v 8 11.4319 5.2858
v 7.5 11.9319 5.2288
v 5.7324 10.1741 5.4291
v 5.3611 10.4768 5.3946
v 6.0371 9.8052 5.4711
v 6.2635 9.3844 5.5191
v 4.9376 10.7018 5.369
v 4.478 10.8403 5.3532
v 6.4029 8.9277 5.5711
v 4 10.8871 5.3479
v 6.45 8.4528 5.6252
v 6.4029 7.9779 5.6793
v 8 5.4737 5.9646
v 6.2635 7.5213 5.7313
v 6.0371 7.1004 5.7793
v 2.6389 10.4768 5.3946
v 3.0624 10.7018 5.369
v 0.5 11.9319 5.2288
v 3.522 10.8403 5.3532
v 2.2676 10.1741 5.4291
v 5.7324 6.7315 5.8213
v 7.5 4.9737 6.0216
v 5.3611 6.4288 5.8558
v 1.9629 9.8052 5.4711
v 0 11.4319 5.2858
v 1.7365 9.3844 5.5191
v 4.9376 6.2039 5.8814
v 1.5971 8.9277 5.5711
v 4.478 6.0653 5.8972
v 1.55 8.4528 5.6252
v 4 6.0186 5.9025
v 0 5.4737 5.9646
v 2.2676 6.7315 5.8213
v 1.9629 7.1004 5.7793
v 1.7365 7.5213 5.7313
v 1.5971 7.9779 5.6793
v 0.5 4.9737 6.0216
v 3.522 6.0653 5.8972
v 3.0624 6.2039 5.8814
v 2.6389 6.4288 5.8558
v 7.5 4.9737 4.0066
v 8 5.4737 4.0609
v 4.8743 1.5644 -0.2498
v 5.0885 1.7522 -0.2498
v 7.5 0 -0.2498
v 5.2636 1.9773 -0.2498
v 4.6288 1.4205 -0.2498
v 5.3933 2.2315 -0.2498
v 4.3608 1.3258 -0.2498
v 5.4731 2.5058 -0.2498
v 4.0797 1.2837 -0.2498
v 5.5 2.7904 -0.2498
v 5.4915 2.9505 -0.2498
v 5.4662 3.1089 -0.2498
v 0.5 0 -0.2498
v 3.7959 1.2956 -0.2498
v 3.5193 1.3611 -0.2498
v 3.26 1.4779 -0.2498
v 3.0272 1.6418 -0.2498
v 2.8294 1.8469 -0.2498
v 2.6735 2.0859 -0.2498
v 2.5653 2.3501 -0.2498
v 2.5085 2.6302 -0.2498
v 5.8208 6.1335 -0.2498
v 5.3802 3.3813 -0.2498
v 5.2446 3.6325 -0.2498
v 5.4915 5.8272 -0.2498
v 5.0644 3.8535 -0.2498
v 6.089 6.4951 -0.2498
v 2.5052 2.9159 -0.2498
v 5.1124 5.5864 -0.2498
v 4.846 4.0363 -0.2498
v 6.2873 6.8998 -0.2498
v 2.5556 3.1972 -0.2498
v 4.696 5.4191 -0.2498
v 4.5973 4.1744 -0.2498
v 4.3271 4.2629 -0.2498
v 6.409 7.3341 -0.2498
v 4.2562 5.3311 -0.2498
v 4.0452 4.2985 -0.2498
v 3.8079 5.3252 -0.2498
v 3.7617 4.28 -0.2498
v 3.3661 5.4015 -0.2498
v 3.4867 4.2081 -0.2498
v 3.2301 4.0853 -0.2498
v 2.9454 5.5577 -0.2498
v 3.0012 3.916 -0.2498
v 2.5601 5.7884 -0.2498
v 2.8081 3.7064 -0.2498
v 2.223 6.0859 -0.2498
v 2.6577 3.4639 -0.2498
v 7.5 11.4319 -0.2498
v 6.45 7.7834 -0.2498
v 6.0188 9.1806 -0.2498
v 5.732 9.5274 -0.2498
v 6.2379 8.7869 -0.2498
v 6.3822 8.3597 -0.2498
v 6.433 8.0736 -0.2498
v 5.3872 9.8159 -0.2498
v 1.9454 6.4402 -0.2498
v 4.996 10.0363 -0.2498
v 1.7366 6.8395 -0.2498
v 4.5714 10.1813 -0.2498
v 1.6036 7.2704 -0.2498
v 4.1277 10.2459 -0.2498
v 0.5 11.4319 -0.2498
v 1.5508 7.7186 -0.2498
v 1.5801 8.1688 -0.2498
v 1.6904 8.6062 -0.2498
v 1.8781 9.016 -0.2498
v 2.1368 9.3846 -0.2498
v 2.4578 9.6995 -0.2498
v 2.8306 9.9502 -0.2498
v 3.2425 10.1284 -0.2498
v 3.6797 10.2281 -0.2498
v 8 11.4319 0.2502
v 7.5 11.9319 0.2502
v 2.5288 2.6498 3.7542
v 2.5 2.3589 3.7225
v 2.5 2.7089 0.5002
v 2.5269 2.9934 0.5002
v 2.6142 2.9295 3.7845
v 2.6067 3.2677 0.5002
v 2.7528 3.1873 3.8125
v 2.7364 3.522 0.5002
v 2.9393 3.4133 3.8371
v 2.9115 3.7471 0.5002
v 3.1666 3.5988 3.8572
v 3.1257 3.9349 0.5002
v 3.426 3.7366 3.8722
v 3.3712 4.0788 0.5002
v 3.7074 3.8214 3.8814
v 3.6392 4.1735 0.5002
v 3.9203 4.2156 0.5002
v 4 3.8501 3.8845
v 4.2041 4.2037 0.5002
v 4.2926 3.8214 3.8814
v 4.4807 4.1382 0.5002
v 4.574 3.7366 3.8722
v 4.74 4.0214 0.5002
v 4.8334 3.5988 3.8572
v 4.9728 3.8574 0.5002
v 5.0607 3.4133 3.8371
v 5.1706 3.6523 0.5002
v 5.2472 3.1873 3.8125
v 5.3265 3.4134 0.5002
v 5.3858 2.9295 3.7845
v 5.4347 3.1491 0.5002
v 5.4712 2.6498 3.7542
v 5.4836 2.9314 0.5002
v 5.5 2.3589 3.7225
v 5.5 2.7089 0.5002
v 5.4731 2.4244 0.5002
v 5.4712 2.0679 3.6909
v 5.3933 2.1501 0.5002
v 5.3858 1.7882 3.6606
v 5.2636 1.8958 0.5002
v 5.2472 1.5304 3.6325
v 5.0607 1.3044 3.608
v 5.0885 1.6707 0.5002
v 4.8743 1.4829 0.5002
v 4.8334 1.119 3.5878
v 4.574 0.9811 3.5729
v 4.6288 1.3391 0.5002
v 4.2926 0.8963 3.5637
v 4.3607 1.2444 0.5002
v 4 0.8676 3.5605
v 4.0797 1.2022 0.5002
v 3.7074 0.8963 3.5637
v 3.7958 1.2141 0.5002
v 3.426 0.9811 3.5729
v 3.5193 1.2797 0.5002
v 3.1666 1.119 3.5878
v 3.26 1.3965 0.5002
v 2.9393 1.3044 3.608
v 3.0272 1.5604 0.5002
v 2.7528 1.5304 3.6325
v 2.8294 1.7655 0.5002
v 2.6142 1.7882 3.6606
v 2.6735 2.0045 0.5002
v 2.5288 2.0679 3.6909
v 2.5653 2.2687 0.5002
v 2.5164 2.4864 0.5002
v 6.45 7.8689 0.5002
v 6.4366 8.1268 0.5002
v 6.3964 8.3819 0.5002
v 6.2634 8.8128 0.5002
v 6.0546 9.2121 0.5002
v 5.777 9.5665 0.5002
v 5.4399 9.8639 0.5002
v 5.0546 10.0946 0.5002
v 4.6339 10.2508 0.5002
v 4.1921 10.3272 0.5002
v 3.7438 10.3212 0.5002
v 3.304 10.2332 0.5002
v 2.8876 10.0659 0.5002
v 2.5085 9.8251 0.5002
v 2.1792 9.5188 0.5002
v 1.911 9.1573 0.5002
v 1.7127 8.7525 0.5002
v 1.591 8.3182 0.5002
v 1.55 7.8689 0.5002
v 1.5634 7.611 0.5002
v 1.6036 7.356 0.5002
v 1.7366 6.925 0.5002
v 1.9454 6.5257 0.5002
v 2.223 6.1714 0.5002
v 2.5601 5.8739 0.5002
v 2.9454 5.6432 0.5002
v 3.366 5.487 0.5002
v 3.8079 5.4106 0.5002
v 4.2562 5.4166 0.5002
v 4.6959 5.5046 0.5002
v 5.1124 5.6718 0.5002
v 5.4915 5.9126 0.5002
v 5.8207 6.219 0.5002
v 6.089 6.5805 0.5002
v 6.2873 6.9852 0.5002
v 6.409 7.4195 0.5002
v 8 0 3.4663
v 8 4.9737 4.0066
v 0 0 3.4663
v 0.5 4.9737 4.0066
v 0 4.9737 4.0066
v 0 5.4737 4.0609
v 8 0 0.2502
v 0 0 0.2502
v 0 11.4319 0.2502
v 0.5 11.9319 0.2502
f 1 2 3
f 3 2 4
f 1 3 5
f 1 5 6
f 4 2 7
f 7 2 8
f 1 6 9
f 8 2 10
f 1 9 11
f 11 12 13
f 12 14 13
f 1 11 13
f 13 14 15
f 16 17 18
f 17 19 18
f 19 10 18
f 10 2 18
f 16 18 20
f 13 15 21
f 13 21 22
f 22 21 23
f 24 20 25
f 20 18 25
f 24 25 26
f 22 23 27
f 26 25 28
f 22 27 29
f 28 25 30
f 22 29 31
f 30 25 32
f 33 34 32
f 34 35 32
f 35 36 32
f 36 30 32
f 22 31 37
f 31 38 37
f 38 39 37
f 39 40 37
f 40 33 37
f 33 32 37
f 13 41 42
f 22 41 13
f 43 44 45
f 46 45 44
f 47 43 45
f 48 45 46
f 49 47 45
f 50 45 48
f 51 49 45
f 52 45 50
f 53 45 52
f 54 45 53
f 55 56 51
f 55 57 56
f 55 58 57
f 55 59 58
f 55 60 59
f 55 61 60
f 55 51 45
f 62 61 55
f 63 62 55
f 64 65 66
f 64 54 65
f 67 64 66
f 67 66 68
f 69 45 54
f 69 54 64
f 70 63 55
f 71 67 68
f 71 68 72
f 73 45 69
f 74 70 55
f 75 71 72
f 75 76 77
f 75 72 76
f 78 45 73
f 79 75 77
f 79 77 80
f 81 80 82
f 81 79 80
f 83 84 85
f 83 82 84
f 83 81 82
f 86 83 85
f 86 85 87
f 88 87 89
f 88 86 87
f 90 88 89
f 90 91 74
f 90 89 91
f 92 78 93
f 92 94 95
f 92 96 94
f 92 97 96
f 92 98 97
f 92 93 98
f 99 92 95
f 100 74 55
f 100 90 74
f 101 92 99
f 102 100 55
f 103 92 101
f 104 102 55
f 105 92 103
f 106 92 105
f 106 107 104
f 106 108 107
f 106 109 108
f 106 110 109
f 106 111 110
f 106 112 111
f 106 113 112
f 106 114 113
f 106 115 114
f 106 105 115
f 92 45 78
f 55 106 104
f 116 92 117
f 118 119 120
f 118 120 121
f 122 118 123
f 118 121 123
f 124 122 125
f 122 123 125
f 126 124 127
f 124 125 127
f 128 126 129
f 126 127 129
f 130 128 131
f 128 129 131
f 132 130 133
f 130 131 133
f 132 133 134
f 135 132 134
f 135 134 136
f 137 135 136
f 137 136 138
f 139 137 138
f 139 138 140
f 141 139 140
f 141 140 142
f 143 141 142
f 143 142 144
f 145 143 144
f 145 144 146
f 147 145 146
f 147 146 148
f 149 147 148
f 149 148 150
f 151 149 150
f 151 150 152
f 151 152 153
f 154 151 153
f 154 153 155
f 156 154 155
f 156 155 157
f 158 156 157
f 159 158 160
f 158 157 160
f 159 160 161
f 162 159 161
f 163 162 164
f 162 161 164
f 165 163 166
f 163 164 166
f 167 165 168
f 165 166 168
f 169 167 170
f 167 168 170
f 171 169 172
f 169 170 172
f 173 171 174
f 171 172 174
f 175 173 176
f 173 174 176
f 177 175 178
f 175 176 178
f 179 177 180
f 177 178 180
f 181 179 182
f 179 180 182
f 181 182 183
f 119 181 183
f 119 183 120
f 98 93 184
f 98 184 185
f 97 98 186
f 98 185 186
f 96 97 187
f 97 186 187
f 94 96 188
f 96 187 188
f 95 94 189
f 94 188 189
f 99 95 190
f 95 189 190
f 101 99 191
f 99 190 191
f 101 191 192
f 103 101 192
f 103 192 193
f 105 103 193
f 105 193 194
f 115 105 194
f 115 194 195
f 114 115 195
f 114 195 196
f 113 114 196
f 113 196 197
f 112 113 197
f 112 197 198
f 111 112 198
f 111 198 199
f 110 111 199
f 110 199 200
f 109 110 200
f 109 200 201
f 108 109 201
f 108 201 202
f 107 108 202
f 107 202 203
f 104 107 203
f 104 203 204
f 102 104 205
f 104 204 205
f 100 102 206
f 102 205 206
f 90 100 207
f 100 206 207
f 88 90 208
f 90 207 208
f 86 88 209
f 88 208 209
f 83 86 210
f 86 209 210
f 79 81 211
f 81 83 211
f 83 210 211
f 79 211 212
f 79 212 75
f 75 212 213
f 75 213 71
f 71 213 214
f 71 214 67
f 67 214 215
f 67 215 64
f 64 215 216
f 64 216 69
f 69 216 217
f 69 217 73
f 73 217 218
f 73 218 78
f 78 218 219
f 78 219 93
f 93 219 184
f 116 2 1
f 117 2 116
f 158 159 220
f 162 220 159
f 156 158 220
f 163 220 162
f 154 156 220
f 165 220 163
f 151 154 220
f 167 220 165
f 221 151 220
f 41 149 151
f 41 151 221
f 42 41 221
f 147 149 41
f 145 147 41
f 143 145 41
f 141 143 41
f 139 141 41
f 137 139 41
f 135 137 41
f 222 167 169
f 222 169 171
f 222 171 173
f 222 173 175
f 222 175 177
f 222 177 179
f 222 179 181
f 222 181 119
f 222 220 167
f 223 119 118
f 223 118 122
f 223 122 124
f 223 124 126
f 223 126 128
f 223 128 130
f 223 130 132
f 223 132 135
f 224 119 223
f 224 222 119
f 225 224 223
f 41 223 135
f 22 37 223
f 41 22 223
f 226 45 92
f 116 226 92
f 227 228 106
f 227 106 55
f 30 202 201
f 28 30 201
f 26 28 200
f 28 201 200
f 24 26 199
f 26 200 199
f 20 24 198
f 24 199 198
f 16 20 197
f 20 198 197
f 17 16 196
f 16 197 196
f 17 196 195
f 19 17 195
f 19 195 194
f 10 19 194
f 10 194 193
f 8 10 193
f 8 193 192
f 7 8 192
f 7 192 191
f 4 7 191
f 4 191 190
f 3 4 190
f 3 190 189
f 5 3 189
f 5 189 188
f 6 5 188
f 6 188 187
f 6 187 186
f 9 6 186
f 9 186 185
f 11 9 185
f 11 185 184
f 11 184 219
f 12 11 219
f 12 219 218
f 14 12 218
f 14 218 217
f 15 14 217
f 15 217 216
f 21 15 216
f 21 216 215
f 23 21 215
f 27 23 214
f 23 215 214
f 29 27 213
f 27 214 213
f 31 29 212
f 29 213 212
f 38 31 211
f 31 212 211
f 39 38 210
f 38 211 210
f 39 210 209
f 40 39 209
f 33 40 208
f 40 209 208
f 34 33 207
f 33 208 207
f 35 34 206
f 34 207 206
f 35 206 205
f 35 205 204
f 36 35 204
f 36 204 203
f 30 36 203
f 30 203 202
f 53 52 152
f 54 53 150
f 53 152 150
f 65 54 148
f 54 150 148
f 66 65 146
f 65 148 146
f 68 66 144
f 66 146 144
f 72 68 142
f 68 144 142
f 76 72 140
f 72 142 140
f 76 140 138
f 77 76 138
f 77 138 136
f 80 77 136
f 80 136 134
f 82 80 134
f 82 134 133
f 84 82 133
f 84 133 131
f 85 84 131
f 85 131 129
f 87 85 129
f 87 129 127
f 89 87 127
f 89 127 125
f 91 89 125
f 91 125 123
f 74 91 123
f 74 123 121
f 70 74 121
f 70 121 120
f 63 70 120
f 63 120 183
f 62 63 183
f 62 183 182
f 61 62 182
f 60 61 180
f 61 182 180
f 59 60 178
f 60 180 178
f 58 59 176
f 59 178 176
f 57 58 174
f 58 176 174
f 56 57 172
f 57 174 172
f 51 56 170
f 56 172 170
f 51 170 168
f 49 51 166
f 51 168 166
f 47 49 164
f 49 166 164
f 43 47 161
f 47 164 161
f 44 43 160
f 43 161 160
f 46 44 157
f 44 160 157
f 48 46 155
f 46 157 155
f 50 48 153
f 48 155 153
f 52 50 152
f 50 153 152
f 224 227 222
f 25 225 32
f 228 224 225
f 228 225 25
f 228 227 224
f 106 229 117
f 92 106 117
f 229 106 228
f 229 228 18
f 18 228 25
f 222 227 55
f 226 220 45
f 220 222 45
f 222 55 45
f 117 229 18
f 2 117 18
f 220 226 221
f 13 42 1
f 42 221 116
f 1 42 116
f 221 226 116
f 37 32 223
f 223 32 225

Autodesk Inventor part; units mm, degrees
ref_plane "YZ Plane" through (0, 0, 0) normal (1, 0, 0) x (0, 1, 0)
ref_plane "XZ Plane" through (0, 0, 0) normal (0, 1, 0) x (-1, 0, 0)
ref_plane "XY Plane" through (0, 0, 0) normal (0, 0, 1) x (1, 0, 0)
sketch "Skizze5" plane through (0, 0, 0) normal (1, 0, 0) x (0, 1, 0)
  line L0 (0, 0) -> (0.5, 0)
  line L1 (0.5, 0) -> (4.9737, 0.486)
  line L2 (4.9737, 0.486) -> (11.4319, -0.2498)
  line L3 (11.4319, -0.2498) -> (11.9319, -0.2498)
  line L4 (11.9319, -0.2498) -> (11.9319, 5.2288)
  line L5 (11.9319, 5.2288) -> (4.9737, 6.0216)
  line L6 (0, 3.4663) -> (0, 0)
  line L7 (0, 3.4663) -> (4.9737, 4.0066)
  line L8 (4.9737, 8.0188) -> (4.9737, 2.9641) construction
  line L9 (4.9737, 6.0216) -> (4.9737, 4.0066)
  point P0 (0, 0)
  dimension "d21" = 0.5
  dimension "d22" = 6.2
  dimension "d23" = 6.5
  dimension "d24" = 4.5
  dimension "d25" = 6.5
  dimension "d26" = 5.5
  dimension "d27" = 3.5
extrude "Extrusion3" add sketch "Skizze5" along normal blind 8
sketch "Skizze6" plane through (8, 11.4319, -0.2498) normal (0, -0.1132032, -0.9935719) x (-1, 0, 0)
  circle A0 centre (4, -3.625) radius 2.45
  line L0 (4, 1.8046) -> (4, -8.9328)
  line L1 (-1.3459, -3.625) -> (9.5603, -3.625)
  line L2 (8, -0.1234) -> (8, -7.1266) projected
  line L3 (8, 0.4968) -> (0, 0.4968) projected
  point P0 (8, -11.3867)
  point P1 (8, -3.625)
  point P2 (4, 0.4968)
  dimension "d30" = 4.9
extrude "Extrusion4" cut sketch "Skizze6" against normal through all
sketch "Skizze7" plane through (8, 4.9737, 0.486) normal (0, 0.1079994, -0.994151) x (-1, 0, 0)
  line L0 (-0.1981, -2.25) -> (9.2596, -2.25)
  line L1 (4, -0.3434) -> (4, -7.0095)
  line L2 (8, -4.9971) -> (0, -4.9971) projected
  line L3 (8, -4.5) -> (8, 0) projected
  circle A0 centre (4, -2.25) radius 1.5
  point P0 (4, -4.9971)
  point P1 (8, -2.25)
  dimension "d33" = 3
extrude "Extrusion5" cut sketch "Skizze7" against normal through all
sketch "Skizze8" plane through (0, 11.4319, -0.2498) normal (0, 0, -1) x (-1, 0, 0)
  line L0 (-8, -6.4582) -> (-8, 0) projected
  line L1 (-8, -10.9319) -> (-8, -6.4582) projected
  line L2 (-8, -11.4319) -> (-8, -10.9319) projected
  line L3 (0, -11.4319) -> (-8, -11.4319) projected
  line L4 (0, -11.4319) -> (0, -10.9319) projected
  line L5 (0, -10.9319) -> (0, -6.4582) projected
  line L6 (0, -6.4582) -> (0, 0) projected
  line L7 (0, 0) -> (0, 0.5) projected
  line L8 (0, 0.5) -> (-8, 0.5) projected
  line L9 (-8, 0) -> (-8, 0.5) projected
extrude "Extrusion6" add sketch "Skizze8" against normal blind 0.75
sketch "Skizze9" plane through (0, 4.9737, 6.0216) normal (0, 0.1132032, 0.9935719) x (1, 0, 0)
  circle A0 centre (4, 3.5016) radius 2.45 projected
  point P0 (0, -4.26)
extrude "Extrusion7" cut sketch "Skizze9" against normal through all
sketch "Skizze10" plane through (0, 0, 3.4663) normal (0, -0.1079994, 0.994151) x (1, 0, 0)
  circle A0 centre (4, 2.3727) radius 1.5 projected
  point P0 (0, -0.3744)
extrude "Extrusion8" cut sketch "Skizze10" against normal through all
chamfer "Fase2" distance 0.5 angle 45 7 edges at (8, 5.9659, -0.2498) (4, 11.9319, -0.2498) (8, 11.9319, 2.4895) (0, 5.9659, -0.2498) (0, 11.9319, 2.4895) (8, 4.9737, 5.0141) (0, 4.9737, 5.0141)
properties part number "led_holder_v11"
